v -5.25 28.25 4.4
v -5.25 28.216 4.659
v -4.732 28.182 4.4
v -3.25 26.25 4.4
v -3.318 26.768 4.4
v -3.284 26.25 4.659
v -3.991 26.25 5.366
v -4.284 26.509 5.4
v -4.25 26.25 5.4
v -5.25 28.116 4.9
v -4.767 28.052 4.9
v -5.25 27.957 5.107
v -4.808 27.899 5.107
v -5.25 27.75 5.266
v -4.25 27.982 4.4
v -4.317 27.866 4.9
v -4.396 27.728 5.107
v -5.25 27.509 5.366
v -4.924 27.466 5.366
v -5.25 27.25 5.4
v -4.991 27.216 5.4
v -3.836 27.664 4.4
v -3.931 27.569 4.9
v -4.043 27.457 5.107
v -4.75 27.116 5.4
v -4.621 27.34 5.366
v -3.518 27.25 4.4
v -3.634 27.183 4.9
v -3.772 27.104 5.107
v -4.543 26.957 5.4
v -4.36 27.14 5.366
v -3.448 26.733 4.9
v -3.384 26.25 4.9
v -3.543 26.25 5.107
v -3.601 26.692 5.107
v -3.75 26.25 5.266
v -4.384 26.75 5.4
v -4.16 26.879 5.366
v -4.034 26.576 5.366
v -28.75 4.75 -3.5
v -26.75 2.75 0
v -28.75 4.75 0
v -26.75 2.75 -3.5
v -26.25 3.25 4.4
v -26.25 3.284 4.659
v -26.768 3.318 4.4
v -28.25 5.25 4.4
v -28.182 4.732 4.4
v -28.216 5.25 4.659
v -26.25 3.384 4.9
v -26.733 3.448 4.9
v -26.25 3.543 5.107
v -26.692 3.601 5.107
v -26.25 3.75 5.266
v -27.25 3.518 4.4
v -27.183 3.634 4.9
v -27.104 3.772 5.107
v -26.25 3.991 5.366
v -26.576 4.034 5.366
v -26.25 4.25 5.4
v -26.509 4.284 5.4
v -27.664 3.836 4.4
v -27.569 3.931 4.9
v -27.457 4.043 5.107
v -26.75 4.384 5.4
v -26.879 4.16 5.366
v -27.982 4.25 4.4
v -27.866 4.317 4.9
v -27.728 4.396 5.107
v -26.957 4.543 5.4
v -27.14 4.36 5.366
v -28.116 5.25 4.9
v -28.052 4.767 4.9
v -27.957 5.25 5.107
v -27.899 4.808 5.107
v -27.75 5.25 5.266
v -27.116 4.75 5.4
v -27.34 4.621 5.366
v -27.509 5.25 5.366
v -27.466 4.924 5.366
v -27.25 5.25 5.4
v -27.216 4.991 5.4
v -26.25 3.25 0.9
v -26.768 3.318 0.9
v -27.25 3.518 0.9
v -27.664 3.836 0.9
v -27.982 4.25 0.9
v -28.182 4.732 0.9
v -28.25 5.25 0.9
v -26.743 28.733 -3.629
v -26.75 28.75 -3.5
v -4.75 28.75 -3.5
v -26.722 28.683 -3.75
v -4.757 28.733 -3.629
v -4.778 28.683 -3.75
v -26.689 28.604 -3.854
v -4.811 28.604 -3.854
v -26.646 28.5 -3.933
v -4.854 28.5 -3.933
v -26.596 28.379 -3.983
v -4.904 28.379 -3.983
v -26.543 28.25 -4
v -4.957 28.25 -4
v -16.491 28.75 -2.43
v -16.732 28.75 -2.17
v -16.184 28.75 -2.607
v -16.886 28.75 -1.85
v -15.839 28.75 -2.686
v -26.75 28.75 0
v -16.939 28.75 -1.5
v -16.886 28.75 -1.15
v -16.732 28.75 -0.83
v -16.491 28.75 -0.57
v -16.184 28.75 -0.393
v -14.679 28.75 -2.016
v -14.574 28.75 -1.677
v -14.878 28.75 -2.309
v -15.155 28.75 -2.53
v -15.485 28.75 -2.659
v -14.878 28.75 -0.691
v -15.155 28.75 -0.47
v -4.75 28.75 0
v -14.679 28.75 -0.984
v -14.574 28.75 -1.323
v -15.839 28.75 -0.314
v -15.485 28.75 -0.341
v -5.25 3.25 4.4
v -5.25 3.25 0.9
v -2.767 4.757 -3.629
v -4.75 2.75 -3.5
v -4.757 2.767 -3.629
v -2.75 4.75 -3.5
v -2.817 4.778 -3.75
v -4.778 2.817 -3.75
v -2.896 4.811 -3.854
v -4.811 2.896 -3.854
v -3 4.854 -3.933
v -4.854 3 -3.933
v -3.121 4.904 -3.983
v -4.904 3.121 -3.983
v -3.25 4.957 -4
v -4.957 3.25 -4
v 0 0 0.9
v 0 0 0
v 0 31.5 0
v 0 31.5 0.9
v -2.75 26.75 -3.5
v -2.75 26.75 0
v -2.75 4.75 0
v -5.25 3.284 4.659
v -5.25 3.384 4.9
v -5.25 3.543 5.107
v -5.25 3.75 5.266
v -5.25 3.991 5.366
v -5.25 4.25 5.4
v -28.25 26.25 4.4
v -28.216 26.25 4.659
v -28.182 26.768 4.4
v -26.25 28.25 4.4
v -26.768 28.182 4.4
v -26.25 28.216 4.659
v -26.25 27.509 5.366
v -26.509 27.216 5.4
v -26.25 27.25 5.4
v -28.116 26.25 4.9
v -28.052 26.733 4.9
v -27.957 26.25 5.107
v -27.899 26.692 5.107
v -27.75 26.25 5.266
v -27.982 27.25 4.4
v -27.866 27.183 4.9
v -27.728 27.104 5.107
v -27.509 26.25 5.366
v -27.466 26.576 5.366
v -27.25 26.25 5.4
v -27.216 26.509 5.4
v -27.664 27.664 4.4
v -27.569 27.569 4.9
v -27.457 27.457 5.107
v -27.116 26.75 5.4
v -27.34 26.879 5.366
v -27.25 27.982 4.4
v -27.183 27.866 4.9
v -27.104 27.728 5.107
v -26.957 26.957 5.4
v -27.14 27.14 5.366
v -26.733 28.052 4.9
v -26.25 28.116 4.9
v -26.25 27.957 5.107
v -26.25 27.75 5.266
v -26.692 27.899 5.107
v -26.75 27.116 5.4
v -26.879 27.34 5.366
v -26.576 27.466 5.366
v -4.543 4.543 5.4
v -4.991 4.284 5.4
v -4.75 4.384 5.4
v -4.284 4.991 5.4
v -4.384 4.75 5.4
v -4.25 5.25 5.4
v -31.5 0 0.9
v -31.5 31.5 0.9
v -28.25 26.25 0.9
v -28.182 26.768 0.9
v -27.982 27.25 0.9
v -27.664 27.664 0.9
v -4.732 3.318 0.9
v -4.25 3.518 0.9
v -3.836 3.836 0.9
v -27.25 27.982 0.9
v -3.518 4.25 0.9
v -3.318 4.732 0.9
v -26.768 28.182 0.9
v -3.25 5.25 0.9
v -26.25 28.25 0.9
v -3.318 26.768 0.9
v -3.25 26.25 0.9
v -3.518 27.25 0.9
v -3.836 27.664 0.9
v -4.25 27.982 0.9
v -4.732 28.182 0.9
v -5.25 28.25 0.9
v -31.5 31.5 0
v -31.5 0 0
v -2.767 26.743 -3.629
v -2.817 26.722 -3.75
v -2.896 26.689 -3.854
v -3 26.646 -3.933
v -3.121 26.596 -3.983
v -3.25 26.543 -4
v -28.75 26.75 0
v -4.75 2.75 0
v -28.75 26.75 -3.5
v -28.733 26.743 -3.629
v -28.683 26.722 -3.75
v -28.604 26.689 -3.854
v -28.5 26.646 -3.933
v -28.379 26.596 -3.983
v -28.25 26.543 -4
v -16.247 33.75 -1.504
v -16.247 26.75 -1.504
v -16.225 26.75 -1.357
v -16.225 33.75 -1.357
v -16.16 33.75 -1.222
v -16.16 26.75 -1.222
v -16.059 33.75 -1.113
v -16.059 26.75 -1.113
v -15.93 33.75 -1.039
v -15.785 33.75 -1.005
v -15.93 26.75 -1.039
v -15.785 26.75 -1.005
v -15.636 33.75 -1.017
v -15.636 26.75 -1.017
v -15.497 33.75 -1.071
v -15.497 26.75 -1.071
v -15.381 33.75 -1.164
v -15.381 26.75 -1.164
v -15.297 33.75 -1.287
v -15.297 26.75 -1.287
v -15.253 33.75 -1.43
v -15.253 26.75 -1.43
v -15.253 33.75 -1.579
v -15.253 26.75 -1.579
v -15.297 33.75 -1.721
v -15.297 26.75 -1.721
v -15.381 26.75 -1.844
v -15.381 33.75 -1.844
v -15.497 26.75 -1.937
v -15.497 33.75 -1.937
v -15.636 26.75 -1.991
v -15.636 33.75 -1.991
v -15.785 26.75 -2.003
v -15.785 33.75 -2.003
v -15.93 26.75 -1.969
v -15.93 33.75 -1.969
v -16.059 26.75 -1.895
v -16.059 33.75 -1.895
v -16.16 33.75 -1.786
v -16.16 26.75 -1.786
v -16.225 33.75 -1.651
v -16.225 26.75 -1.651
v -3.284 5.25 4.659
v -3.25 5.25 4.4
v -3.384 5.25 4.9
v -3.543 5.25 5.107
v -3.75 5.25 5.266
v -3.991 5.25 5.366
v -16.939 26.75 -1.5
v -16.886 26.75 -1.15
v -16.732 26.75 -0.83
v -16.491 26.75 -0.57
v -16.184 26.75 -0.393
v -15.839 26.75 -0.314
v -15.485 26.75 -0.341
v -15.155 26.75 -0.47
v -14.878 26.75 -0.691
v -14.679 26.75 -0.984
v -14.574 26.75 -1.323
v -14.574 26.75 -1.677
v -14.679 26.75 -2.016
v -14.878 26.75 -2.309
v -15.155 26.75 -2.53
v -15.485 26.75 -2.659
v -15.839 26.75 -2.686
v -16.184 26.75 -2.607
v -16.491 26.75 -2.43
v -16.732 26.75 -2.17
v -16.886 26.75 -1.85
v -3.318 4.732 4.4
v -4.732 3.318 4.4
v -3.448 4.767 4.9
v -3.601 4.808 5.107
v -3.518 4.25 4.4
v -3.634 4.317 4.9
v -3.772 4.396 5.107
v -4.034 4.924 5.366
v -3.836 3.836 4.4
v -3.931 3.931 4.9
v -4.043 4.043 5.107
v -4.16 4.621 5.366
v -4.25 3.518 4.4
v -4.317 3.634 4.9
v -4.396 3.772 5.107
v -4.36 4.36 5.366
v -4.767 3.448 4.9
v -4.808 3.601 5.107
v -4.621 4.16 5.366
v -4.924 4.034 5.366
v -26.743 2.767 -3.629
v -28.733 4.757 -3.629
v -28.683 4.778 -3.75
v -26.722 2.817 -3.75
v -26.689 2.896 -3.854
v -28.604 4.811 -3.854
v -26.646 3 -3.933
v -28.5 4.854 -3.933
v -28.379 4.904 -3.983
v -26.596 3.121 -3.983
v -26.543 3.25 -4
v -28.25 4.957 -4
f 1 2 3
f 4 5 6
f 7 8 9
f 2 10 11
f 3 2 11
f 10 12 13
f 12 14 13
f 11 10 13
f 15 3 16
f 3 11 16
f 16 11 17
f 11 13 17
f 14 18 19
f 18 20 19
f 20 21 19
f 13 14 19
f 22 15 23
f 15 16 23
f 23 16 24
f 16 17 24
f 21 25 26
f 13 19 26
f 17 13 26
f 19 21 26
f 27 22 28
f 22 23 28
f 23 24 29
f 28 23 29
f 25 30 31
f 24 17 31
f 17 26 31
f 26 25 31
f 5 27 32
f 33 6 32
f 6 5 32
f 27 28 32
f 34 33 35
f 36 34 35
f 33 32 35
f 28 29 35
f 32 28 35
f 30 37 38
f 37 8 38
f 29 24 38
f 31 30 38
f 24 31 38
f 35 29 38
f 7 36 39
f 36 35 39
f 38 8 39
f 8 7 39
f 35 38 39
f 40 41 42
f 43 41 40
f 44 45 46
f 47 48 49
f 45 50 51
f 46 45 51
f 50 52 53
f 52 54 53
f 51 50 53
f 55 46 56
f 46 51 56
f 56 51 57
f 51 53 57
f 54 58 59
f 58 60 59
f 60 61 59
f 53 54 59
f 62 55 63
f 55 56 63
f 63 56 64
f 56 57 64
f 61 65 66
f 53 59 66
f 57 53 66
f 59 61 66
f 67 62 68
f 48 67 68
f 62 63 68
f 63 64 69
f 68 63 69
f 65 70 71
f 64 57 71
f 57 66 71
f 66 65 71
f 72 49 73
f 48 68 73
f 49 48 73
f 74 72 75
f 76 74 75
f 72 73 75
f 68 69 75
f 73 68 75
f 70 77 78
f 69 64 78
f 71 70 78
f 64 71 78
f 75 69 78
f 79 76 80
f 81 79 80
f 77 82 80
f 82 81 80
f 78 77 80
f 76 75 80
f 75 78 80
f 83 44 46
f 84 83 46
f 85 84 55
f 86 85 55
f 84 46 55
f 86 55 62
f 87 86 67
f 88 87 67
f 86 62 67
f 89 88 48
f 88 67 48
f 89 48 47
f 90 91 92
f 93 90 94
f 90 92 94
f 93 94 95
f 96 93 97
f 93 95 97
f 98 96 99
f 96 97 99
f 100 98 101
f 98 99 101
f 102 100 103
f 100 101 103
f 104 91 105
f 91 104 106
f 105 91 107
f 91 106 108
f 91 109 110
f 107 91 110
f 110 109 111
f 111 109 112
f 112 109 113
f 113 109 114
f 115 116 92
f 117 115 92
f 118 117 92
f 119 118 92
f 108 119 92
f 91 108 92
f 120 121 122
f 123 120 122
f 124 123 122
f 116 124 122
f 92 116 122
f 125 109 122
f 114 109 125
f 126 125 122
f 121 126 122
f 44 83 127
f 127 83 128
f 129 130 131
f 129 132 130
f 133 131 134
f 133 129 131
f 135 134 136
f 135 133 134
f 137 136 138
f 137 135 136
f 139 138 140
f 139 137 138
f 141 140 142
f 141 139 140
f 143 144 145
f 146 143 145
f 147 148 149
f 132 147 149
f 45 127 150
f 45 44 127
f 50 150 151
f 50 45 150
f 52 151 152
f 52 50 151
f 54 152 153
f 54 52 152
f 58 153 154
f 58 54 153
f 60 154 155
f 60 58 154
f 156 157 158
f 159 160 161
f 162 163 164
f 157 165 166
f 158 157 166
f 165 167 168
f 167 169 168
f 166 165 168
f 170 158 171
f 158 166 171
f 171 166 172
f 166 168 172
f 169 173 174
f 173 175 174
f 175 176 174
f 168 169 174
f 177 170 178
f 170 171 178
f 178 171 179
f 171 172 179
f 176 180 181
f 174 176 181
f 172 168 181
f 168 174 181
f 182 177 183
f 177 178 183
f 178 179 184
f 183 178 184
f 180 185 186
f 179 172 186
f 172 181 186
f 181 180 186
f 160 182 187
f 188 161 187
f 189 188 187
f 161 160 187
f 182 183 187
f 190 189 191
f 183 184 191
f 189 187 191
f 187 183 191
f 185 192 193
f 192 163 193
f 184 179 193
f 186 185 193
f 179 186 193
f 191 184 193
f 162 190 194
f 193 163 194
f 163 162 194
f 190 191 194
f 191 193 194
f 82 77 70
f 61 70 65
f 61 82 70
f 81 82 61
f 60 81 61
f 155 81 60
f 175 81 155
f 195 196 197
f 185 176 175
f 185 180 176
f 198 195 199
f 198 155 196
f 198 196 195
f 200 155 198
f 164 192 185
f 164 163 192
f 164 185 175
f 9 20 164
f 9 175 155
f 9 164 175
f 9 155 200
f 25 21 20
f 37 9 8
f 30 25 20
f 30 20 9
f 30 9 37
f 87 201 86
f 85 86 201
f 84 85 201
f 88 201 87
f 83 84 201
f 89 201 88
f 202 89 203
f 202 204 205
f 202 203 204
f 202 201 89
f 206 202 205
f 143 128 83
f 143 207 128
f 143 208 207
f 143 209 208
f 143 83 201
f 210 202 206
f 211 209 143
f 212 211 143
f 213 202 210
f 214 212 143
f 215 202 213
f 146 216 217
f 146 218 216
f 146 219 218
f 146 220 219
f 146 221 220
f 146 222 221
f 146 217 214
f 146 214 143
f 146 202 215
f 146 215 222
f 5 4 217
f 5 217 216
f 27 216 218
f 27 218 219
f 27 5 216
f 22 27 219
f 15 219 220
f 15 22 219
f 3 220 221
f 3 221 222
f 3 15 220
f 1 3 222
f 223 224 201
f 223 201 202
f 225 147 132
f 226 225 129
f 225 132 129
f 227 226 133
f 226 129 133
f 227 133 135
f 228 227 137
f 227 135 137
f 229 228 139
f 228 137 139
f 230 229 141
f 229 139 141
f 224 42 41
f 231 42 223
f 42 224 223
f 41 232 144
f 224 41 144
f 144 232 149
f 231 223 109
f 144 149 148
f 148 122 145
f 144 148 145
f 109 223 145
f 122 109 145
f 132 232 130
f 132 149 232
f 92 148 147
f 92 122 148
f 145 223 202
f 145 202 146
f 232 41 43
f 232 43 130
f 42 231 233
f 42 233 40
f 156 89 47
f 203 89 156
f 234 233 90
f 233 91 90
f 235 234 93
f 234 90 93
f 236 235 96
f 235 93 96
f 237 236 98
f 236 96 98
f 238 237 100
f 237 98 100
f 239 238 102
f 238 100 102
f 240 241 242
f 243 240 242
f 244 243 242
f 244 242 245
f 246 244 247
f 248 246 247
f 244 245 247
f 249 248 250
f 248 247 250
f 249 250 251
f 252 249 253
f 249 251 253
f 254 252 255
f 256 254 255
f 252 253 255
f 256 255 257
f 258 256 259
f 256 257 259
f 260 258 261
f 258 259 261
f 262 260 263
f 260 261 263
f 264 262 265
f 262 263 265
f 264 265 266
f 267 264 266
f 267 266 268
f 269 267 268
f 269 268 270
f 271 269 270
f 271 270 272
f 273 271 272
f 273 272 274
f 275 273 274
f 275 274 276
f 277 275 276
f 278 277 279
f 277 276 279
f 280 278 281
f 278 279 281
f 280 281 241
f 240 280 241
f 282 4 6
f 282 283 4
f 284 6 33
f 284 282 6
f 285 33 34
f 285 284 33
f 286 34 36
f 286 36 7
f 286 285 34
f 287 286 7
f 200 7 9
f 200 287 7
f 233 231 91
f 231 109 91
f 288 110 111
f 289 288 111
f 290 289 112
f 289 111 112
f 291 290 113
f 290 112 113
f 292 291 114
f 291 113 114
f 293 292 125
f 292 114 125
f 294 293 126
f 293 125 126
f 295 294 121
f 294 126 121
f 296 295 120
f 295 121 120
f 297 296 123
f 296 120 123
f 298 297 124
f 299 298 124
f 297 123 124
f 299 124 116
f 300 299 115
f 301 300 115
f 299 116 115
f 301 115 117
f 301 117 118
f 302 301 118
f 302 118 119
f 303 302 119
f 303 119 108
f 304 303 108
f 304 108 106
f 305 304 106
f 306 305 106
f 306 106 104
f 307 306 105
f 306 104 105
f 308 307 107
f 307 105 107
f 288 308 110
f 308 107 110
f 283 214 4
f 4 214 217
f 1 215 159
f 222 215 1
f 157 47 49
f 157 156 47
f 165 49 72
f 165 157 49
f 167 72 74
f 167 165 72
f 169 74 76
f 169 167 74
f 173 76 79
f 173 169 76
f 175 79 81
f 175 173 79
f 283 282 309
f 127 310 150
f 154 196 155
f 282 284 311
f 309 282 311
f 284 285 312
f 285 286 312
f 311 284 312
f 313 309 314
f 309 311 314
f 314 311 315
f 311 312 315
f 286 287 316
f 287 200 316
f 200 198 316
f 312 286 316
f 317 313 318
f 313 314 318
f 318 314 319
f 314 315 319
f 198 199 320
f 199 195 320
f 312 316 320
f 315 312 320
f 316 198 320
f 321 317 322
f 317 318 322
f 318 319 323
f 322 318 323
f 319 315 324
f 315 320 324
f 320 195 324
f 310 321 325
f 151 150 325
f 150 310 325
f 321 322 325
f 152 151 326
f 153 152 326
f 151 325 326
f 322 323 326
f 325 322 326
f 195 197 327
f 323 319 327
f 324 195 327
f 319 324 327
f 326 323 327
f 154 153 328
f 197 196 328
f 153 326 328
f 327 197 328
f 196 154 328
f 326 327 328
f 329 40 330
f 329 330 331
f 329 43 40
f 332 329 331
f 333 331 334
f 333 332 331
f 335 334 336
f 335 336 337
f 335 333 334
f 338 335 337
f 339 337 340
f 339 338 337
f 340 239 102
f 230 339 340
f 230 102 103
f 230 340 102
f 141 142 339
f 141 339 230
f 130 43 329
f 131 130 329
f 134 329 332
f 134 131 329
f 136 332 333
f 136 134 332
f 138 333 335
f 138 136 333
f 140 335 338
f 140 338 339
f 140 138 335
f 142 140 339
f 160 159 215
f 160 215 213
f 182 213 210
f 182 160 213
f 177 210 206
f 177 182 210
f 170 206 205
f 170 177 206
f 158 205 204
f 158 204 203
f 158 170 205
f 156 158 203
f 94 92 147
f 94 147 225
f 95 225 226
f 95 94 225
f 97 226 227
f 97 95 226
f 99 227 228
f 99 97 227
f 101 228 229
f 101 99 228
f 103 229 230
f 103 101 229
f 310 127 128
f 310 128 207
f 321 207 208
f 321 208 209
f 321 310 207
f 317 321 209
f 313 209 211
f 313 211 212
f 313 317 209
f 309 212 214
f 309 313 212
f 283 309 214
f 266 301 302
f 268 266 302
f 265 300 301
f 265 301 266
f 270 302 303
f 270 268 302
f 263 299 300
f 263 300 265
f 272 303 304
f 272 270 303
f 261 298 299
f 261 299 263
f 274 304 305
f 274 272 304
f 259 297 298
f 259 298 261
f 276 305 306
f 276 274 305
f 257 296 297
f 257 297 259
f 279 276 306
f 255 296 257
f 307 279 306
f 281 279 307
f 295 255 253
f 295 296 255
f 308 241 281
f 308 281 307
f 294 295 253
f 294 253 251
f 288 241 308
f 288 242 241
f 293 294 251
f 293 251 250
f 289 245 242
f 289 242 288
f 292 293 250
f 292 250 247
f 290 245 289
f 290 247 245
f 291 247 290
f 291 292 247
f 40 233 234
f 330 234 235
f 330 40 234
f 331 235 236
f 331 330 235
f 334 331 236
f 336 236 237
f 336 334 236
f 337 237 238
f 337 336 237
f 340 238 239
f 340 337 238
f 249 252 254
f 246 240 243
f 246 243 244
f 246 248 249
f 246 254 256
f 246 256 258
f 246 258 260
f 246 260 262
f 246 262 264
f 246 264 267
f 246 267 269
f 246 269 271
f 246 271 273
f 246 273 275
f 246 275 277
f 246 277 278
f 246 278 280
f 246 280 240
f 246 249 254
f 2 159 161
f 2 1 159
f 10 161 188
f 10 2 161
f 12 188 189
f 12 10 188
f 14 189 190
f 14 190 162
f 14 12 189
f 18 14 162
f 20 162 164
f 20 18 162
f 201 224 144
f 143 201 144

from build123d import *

# Parameters (mm, degrees)
SKETCH_W     = 31.5
SKETCH_H     = 31.5
PAD_DEPTH    = 0.9
SKETCH001_W  = 26
SKETCH001_H  = 26
PAD001_DEPTH = 4
SKETCH002_W  = 25
SKETCH002_H  = 25
PAD002_DEPTH = 4.5
FILLET_R     = 2
FILLET001_R  = 1
CHAMFER_SIZE = 2
FILLET002_R  = 0.5
SKETCH003_R  = 1.18907
POCKET_DEPTH = 2
SKETCH004_R  = 0.5
PAD003_DEPTH = 7


with BuildPart() as part:
    # Sketch → Pad (new body)
    with BuildSketch(Plane.XY):
        with Locations((-15.75, 15.75)):
            Rectangle(SKETCH_W, SKETCH_H)
    extrude(amount=PAD_DEPTH)

    # Sketch001 (on Face5 of Pad) → Pad001 (join)
    with BuildSketch(Plane(origin=(0, 0, 0), x_dir=(1, 0, 0), z_dir=(0, 0, -1))):
        with Locations((-15.75, -15.75)):
            Rectangle(SKETCH001_W, SKETCH001_H)
    extrude(amount=PAD001_DEPTH)

    # Sketch002 (on Face5 of Pad001) → Pad002 (join)
    with BuildSketch(Plane.XY.offset(0.9)):
        with Locations((-15.75, 15.75)):
            Rectangle(SKETCH002_W, SKETCH002_H)
    extrude(amount=PAD002_DEPTH)

    # Fillet
    fillet_edges = [part.edges().sort_by_distance(p)[0] for p in [
        (-3.25, 28.25, 3.15),
        (-3.25, 3.25, 3.15),
        (-28.25, 28.25, 3.15),
        (-28.25, 3.25, 3.15),
    ]]
    fillet(fillet_edges, radius=FILLET_R)

    # Fillet001
    fillet001_edges = [part.edges().sort_by_distance(p)[0] for p in [
        (-15.75, 28.25, 5.4),
        (-27.664214, 27.664214, 5.4),
        (-3.835786, 27.664214, 5.4),
        (-28.25, 15.75, 5.4),
        (-3.25, 15.75, 5.4),
        (-27.664214, 3.835786, 5.4),
        (-3.835786, 3.835786, 5.4),
        (-15.75, 3.25, 5.4),
    ]]
    fillet(fillet001_edges, radius=FILLET001_R)

    # Chamfer
    chamfer_edges = [part.edges().sort_by_distance(p)[0] for p in [
        (-2.75, 2.75, -2),
        (-2.75, 28.75, -2),
        (-28.75, 2.75, -2),
        (-28.75, 28.75, -2),
    ]]
    chamfer(chamfer_edges, length=CHAMFER_SIZE)

    # Fillet002
    fillet002_edges = [part.edges().sort_by_distance(p)[0] for p in [
        (-15.75, 2.75, -4),
        (-27.75, 3.75, -4),
        (-3.75, 3.75, -4),
        (-28.75, 15.75, -4),
        (-2.75, 15.75, -4),
        (-27.75, 27.75, -4),
        (-3.75, 27.75, -4),
        (-15.75, 28.75, -4),
    ]]
    fillet(fillet002_edges, radius=FILLET002_R)

    # Sketch003 (on Face7 of Fillet002) → Pocket (cut)
    with BuildSketch(Plane(origin=(0, 28.75, 0), x_dir=(-1, 0, 0), z_dir=(0, 1, 0))):
        with Locations((15.75, -1.5)):
            Circle(SKETCH003_R)
    extrude(amount=-POCKET_DEPTH, mode=Mode.SUBTRACT)

    # Sketch004 (on Face25 of Pocket) → Pad003 (join)
    with BuildSketch(Plane(origin=(0, 26.75, 0), x_dir=(-1, 0, 0), z_dir=(0, 1, 0))):
        with Locations((15.747266, -1.504022)):
            Circle(SKETCH004_R)
    extrude(amount=PAD003_DEPTH)


solid = part.part
